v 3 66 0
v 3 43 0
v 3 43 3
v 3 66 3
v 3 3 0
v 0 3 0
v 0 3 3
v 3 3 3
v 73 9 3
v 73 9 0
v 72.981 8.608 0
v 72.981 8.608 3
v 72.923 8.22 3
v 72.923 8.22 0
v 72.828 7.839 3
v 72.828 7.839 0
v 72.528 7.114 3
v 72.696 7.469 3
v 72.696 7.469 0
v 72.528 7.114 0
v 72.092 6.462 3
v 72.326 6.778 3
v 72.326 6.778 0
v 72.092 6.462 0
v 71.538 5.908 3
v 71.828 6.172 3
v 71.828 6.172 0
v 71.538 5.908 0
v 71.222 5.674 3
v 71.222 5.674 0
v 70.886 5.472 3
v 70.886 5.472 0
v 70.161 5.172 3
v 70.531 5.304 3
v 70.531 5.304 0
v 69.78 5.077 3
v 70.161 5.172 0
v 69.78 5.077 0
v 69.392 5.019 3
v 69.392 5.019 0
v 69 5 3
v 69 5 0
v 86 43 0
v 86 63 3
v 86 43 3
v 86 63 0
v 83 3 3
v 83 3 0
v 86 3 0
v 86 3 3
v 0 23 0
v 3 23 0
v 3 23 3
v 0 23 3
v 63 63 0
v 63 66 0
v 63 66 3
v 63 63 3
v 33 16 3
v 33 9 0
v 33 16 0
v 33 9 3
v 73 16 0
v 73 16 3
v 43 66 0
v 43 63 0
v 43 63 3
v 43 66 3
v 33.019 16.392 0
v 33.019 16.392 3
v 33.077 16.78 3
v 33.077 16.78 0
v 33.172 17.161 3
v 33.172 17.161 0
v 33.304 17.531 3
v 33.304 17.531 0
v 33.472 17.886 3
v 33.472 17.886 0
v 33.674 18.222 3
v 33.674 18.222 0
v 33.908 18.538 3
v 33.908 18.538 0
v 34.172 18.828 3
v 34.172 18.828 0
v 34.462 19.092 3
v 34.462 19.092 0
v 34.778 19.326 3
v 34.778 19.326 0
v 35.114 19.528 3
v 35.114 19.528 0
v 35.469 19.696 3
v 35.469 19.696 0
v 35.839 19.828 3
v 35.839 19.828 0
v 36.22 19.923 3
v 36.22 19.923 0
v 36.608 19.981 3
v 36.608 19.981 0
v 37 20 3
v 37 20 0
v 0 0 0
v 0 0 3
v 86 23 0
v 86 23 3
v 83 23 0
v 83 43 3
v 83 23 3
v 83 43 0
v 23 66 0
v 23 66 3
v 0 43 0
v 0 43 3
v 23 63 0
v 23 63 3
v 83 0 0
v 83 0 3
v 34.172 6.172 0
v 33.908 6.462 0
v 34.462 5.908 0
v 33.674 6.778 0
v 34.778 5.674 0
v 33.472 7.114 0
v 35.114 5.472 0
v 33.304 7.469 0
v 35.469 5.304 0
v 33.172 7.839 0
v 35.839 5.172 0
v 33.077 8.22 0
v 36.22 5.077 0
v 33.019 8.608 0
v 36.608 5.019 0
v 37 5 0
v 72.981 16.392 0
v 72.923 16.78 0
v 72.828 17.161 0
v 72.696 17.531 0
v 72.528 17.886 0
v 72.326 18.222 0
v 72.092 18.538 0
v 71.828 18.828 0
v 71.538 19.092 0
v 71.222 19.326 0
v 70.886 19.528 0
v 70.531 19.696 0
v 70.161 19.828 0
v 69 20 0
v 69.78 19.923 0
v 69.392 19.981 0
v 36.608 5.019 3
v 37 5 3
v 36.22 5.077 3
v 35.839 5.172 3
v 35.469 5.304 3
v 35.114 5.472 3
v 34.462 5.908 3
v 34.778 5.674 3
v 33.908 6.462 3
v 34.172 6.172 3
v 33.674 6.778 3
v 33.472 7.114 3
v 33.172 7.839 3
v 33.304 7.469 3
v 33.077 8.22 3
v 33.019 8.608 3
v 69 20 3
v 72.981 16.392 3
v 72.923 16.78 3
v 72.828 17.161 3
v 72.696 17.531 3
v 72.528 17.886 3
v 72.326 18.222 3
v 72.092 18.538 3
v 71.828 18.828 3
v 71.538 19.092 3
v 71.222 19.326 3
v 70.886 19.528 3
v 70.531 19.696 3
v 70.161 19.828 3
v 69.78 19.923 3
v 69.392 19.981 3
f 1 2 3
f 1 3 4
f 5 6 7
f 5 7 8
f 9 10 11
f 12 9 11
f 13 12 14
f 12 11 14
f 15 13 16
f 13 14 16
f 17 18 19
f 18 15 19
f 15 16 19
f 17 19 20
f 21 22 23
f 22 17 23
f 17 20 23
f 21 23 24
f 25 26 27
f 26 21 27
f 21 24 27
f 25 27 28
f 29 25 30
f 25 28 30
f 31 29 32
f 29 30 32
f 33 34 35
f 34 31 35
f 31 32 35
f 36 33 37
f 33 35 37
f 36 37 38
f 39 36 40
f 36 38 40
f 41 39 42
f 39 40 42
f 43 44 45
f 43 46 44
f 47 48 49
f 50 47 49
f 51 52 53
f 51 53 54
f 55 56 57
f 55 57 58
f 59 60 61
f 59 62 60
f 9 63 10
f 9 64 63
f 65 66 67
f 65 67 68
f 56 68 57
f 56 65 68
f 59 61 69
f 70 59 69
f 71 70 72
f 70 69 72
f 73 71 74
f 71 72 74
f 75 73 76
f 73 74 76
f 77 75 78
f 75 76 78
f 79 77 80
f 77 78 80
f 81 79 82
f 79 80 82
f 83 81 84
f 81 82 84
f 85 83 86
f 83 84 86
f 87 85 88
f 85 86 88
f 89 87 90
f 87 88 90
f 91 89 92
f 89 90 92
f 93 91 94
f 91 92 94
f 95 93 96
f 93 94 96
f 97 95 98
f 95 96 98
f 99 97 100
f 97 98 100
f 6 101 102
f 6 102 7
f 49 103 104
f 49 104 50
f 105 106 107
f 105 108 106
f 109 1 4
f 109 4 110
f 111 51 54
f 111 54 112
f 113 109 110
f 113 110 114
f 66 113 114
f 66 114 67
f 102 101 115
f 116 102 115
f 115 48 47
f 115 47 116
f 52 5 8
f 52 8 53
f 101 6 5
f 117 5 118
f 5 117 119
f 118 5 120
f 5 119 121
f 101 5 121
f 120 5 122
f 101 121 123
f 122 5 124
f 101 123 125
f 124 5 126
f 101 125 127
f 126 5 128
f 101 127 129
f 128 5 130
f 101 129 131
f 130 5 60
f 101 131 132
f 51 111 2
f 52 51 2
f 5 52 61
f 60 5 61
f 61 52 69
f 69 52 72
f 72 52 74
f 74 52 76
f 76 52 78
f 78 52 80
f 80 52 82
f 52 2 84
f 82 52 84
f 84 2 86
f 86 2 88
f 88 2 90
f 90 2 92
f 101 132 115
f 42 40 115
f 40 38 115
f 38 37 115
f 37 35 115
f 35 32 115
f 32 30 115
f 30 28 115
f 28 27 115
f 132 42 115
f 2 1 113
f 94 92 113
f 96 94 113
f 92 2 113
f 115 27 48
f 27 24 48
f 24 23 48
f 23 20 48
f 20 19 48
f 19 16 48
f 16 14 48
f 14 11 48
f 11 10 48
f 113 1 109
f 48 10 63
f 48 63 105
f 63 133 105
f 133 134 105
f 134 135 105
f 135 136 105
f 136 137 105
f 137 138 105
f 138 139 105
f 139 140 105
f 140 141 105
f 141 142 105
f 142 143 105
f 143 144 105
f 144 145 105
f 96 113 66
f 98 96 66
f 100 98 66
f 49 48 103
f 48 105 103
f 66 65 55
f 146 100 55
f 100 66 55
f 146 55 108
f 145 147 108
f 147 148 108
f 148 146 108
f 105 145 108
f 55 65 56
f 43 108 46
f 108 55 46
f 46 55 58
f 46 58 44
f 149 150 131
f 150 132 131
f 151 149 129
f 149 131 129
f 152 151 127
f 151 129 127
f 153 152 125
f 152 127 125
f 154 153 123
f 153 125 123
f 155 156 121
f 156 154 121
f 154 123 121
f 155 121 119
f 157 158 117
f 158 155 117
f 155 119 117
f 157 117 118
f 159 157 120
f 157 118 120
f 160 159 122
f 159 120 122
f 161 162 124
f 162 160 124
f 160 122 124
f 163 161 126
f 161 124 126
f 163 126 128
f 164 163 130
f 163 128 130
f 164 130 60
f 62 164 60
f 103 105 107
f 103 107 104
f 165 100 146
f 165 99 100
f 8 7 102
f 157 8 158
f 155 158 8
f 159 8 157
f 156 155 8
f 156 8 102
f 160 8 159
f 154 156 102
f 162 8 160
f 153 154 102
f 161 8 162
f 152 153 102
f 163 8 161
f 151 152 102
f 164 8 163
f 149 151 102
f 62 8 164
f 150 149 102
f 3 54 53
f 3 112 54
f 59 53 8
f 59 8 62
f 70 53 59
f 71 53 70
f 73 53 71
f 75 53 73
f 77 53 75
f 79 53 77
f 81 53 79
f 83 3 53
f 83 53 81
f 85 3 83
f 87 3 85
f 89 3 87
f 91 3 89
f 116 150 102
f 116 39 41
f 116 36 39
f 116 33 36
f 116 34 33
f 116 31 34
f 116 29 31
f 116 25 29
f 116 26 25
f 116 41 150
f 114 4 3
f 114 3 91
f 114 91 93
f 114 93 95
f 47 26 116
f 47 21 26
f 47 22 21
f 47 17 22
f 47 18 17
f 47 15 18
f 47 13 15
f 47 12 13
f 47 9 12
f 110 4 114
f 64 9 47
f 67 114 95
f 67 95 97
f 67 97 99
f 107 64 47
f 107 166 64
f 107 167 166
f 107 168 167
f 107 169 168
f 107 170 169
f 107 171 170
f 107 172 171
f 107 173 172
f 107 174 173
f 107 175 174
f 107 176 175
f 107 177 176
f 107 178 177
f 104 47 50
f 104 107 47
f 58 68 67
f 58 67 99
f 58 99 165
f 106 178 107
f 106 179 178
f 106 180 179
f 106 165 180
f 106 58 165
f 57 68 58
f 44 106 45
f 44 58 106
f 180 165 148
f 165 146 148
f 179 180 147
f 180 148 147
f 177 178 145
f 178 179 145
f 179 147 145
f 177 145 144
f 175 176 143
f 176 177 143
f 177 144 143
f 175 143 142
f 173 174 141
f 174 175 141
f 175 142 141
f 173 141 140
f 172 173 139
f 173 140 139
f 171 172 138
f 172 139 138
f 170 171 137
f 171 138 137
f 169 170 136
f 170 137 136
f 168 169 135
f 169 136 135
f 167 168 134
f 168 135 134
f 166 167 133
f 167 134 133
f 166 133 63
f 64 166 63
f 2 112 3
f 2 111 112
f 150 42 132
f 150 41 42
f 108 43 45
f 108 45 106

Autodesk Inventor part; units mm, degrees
ref_plane "YZ Plane" through (0, 0, 0) normal (1, 0, 0) x (0, 1, 0)
ref_plane "XZ Plane" through (0, 0, 0) normal (0, 1, 0) x (-1, 0, 0)
ref_plane "XY Plane" through (0, 0, 0) normal (0, 0, 1) x (1, 0, 0)
sketch "Sketch1" plane through (0, 0, 0) normal (0, 0, 1) x (1, 0, 0)
  line L0 (0, 0) -> (83, 0)
  line L1 (0, 0) -> (0, 3)
  line L2 (0, 3) -> (3, 3)
  line L3 (3, 3) -> (3, 23)
  line L4 (3, 23) -> (0, 23)
  line L5 (0, 23) -> (0, 43)
  line L6 (0, 43) -> (3, 43)
  line L7 (3, 43) -> (3, 63)
  line L8 (3, 63) -> (3, 66)
  line L9 (3, 66) -> (23, 66)
  line L10 (23, 66) -> (23, 63)
  line L11 (23, 63) -> (43, 63)
  line L12 (43, 63) -> (43, 66)
  line L13 (43, 66) -> (63, 66)
  line L14 (63, 66) -> (63, 63)
  line L15 (63, 63) -> (83, 63)
  line L16 (83, 63) -> (86, 63)
  line L17 (86, 63) -> (86, 43)
  line L18 (86, 43) -> (83, 43)
  line L19 (83, 43) -> (83, 23)
  line L20 (83, 23) -> (86, 23)
  line L21 (86, 23) -> (86, 3)
  line L22 (83, 3) -> (83, 0)
  line L23 (83, 3) -> (86, 3)
  dimension "d0" = 83
  dimension "d1" = 3
  dimension "d2" = 3
  dimension "d3" = 20
  dimension "d4" = 20
  dimension "d5" = 20
  dimension "d6" = 3
  dimension "d7" = 20
  dimension "d8" = 20
  dimension "d9" = 20
  dimension "d10" = 20
  dimension "d11" = 3
  dimension "d12" = 20
  dimension "d13" = 3
  dimension "d14" = 20
  dimension "d16" = 20
extrude "Extrusion1" add sketch "Sketch1" along normal blind 3
sketch "Sketch2" plane through (0, 0, 3) normal (0, 0, 1) x (1, 0, 0)
  line L0 (33, 20) -> (73, 20)
  line L1 (73, 20) -> (73, 5)
  line L2 (73, 5) -> (33, 5)
  line L3 (33, 5) -> (33, 20)
  line L4 (0, 0) -> (83, 0) projected
  line L5 (83, 23) -> (83, 43) projected
  dimension "d19" = 5
  dimension "d20" = 10
  dimension "d21" = 15
  dimension "d22" = 40
extrude "Extrusion2" cut sketch "Sketch2" against normal through all
fillet "Fillet1" radius 4 4 edges at (73, 5, 1.5) (73, 20, 1.5) (33, 20, 1.5) (33, 5, 1.5)
properties part number "ControlBoxSide" material "Wood (Birch)"
